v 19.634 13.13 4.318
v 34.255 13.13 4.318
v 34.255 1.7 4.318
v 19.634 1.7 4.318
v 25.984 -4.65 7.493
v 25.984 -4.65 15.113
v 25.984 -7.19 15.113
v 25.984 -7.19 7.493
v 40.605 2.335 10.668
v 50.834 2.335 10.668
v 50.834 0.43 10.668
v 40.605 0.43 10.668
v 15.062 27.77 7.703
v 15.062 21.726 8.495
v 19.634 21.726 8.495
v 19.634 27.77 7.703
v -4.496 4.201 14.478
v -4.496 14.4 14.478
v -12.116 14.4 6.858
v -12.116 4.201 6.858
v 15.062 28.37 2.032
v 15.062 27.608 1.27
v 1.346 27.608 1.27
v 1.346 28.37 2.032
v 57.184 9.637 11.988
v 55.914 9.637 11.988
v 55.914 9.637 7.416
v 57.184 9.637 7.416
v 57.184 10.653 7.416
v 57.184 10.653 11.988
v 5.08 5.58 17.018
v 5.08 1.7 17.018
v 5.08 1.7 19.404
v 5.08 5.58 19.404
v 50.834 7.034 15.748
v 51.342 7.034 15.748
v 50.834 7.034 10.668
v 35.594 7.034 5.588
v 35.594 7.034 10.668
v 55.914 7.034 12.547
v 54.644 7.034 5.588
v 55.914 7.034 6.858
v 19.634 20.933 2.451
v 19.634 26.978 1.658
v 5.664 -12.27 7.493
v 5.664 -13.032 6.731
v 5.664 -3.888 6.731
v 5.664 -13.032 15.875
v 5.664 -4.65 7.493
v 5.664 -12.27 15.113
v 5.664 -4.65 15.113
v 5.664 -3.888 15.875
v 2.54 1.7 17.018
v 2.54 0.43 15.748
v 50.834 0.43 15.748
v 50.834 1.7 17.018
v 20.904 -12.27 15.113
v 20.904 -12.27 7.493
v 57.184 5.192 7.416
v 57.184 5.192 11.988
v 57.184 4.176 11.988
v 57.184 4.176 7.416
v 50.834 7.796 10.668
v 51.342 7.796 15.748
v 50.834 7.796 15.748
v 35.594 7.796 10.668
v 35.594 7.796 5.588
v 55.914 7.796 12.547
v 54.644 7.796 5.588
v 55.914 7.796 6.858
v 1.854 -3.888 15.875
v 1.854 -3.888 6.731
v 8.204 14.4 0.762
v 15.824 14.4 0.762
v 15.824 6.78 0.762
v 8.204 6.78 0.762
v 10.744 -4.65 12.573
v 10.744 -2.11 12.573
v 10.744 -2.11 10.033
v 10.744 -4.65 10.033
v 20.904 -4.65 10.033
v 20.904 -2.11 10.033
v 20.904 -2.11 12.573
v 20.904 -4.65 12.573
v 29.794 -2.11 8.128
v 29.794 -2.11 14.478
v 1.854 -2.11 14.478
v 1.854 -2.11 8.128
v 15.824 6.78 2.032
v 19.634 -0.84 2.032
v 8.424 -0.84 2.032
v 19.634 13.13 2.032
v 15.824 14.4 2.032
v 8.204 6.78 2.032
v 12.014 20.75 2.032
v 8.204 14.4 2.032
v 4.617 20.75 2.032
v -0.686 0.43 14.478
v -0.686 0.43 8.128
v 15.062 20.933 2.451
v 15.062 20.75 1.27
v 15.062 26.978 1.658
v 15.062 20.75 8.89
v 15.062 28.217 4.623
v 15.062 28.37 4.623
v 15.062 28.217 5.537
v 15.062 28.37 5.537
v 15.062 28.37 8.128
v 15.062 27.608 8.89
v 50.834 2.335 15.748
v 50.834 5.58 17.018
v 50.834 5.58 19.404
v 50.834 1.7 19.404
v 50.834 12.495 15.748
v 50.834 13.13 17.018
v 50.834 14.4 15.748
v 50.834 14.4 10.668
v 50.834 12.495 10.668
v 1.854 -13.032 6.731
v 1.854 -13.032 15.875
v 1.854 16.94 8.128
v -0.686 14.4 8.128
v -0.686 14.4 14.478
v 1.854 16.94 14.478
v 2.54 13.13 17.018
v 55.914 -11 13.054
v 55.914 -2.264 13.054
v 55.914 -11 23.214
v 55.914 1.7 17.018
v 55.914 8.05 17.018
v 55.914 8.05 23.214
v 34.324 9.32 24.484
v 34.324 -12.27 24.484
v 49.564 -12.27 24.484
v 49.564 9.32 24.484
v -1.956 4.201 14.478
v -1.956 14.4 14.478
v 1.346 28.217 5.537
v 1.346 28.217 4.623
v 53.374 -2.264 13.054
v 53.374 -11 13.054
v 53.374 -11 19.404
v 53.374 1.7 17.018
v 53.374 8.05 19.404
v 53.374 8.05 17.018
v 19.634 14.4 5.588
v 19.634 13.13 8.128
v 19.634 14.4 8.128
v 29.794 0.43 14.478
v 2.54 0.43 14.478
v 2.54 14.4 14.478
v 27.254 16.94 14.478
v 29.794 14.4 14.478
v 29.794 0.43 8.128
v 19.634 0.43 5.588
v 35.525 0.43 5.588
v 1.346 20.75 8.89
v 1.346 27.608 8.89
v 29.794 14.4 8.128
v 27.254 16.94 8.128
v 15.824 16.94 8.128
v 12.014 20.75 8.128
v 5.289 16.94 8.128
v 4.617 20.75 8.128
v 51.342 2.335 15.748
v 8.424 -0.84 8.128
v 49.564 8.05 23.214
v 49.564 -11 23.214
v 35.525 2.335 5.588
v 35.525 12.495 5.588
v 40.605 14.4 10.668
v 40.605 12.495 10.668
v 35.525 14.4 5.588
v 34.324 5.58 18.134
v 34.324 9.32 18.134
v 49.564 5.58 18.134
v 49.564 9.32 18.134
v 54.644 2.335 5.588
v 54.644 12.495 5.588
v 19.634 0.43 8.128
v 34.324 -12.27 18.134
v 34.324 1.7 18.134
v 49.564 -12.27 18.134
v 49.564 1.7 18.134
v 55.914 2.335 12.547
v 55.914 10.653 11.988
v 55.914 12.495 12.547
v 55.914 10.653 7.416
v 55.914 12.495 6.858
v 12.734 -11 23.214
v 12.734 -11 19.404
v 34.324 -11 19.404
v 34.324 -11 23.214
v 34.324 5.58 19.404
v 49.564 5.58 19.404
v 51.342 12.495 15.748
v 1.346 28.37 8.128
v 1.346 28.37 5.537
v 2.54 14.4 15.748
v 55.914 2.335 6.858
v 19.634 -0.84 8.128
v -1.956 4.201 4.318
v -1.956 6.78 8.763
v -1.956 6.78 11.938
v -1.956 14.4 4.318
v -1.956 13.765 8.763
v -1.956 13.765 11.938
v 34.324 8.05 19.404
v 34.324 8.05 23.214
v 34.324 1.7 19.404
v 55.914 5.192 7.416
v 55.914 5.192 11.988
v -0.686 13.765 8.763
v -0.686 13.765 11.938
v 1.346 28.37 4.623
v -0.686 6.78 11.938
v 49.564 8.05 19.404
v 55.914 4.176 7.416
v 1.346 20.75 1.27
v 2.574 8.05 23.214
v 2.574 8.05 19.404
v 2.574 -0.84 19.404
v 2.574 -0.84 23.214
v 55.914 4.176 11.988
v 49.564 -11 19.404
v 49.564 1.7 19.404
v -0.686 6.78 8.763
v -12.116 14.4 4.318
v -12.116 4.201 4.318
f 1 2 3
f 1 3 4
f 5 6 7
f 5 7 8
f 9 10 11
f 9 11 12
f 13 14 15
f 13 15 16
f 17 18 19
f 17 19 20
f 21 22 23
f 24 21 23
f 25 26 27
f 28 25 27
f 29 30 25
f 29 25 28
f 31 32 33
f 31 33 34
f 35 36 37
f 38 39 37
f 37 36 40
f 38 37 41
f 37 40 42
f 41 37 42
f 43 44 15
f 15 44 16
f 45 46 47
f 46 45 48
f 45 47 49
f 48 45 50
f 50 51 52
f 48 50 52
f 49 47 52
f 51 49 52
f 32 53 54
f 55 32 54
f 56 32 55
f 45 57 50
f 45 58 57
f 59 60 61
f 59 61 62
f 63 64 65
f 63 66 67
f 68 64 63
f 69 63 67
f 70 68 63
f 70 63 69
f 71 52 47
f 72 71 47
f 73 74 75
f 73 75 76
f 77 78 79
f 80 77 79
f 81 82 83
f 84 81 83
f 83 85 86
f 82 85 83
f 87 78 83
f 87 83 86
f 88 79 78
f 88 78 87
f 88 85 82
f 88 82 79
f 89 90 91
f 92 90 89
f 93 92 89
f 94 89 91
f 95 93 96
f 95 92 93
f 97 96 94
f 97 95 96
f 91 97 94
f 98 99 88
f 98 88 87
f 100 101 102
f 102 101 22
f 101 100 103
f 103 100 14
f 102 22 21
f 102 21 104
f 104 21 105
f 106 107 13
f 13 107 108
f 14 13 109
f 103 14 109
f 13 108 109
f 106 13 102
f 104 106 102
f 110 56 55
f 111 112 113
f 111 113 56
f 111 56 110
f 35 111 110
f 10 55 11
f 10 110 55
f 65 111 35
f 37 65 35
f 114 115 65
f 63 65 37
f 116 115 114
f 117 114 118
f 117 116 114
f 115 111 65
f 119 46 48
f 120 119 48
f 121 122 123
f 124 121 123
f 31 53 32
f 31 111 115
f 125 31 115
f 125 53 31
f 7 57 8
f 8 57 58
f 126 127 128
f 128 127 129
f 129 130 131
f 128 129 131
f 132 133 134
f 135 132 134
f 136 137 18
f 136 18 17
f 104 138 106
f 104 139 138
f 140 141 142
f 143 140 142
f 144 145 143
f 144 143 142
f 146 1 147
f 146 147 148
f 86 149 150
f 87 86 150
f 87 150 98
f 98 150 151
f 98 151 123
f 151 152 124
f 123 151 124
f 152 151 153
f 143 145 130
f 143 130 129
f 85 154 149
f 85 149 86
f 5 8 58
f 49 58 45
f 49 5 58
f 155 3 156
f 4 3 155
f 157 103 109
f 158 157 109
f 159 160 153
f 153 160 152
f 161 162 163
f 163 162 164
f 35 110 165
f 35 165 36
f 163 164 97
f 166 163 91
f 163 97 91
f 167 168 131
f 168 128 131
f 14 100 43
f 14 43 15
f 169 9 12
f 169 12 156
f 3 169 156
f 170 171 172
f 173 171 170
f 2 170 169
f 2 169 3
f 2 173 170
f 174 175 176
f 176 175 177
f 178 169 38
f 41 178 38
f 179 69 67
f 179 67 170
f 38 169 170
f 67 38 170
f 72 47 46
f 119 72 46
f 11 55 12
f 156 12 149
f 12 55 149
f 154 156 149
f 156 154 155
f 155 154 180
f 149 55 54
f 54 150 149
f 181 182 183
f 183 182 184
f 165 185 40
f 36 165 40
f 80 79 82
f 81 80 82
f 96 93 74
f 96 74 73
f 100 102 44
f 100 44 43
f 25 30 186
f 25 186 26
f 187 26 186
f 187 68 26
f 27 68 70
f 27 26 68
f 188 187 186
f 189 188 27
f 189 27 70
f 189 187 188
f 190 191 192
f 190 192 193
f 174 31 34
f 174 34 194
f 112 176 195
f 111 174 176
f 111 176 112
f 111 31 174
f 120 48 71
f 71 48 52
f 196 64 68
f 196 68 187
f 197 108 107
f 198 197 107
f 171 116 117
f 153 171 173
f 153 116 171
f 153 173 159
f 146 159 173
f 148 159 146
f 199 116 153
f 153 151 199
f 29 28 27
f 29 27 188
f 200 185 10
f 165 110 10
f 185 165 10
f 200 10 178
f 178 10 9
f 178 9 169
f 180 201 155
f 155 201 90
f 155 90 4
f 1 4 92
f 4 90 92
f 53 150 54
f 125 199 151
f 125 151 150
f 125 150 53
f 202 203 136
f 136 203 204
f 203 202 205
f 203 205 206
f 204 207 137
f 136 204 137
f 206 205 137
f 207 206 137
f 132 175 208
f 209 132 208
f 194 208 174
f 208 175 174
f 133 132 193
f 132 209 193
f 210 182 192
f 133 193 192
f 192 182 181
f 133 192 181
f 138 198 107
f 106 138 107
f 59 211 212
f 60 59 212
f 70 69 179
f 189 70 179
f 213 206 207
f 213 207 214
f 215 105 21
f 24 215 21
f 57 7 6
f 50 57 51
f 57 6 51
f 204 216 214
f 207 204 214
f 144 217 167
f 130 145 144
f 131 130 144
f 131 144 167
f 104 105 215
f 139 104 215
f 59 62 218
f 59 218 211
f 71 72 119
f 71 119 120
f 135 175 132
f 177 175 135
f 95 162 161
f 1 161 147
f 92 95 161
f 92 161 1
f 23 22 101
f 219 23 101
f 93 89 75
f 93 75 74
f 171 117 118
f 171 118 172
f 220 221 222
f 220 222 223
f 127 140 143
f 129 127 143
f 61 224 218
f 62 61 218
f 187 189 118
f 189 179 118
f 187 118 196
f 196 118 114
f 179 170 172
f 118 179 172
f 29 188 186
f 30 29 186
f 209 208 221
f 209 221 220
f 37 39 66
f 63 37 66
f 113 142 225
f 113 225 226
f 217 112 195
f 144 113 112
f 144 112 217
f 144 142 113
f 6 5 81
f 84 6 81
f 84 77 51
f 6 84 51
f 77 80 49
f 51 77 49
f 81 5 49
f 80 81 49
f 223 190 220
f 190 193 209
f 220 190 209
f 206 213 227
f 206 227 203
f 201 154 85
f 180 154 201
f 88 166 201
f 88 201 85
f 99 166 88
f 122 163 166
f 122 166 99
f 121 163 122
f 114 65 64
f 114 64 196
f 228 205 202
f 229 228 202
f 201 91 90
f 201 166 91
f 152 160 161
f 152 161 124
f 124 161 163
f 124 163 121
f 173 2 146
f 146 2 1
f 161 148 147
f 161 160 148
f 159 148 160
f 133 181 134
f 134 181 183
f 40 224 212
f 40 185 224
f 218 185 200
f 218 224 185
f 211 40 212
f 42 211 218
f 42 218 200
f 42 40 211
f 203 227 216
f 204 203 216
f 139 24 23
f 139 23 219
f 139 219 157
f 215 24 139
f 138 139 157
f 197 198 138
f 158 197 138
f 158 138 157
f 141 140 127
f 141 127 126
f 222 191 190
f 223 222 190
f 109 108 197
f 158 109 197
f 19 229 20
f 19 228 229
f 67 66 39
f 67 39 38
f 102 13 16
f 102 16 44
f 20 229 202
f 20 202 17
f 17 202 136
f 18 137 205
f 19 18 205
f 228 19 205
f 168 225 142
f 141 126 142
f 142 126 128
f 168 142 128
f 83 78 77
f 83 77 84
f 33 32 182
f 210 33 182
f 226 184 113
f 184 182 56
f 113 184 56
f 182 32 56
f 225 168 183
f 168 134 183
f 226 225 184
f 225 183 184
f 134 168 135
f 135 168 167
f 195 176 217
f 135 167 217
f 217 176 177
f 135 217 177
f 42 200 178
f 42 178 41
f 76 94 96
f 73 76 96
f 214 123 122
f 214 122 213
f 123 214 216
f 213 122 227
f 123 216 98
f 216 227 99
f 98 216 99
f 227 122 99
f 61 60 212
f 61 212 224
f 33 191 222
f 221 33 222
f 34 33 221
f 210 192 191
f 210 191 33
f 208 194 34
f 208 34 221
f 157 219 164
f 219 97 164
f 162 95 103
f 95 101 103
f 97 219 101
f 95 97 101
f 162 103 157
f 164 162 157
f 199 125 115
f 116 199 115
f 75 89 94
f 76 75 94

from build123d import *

# Parameters (mm, degrees)
BOSS_EXTRUDE1_DEPTH       = 10.16
BOSS_EXTRUDE2_DEPTH       = 5.08
BOSS_EXTRUDE2_DEPTH_BACK  = 17.78
CHAMFER1_SIZE             = 1.27
BOSS_EXTRUDE3_DEPTH       = 7.62
CUT_EXTRUDE1_DEPTH        = 0.254
SCALE1_SCALE              = 0.6
CHAMFER3_SIZE             = 24.13
CHAMFER3_SIZE_2           = 4.254770044
BOSS_EXTRUDE7_DEPTH       = 6.35
CHAMFER4_SIZE             = 2.54
SKETCH9_W                 = 10.985229955
SKETCH9_H                 = 6.096
SKETCH9_W_2               = 4.255191267
CUT_EXTRUDE4_DEPTH        = 1.27
BOSS_EXTRUDE8_DEPTH       = 63.5
SKETCH12_W                = 0.141876601
SKETCH12_H                = 13.97
SKETCH12_W_2              = 2.398123399
CUT_EXTRUDE7_DEPTH        = 2.54
CHAMFER5_SIZE             = 1.27
SKETCH14_W                = 3.81
SKETCH14_H                = 7.62
BOSS_EXTRUDE9_DEPTH       = 1.27
SKETCH15_W                = 3.81
SKETCH15_H                = 7.62
BOSS_EXTRUDE10_DEPTH      = 10.16
SKETCH16_W                = 1.27
SKETCH16_H                = 7.62
CUT_EXTRUDE8_DEPTH        = 0.635
SKETCH17_W                = 1.27
SKETCH17_H                = 3.175
CUT_EXTRUDE9_DEPTH        = 0.635
CHAMFER6_SIZE             = 7.62
BOSS_EXTRUDE11_DEPTH      = 6.35
SKETCH19_W                = 43.866481186
SKETCH19_H                = 13.97
BOSS_EXTRUDE12_DEPTH      = 10.16
CHAMFER7_SIZE             = 1.27
SKETCH20_W                = 12.665631385
SKETCH20_H                = 5.08
SKETCH20_H_2              = 1.237744284
CUT_EXTRUDE12_DEPTH       = 17.78
SKETCH6_W                 = 7.62
SKETCH6_H                 = 7.62
BOSS_EXTRUDE13_DEPTH      = 1.27
SKETCH21_W                = 12.665631385
SKETCH21_H                = 6.35
CUT_EXTRUDE14_DEPTH       = 17.78
CUT_EXTRUDE15_DEPTH       = 17.78
BOSS_EXTRUDE14_DEPTH      = 2.54
SKETCH25_W                = 3.81
SKETCH25_H                = 19.05
BOSS_EXTRUDE15_DEPTH      = 50.8
CHAMFER8_SIZE             = 10.16
SKETCH26_W                = 45.754368615
SKETCH26_H                = 3.880635149
BOSS_EXTRUDE18_DEPTH      = 5.08
BOSS_EXTRUDE19_DEPTH      = 1.27
BOSS_EXTRUDE19_DEPTH_BACK = 5.08
SKETCH27_W                = 15.24
SKETCH27_H                = 19.05
SKETCH27_H_2              = 1.27
SKETCH28_W                = 10.16
SKETCH28_H                = 1.27
BOSS_EXTRUDE20_DEPTH      = 2.54
SKETCH29_W                = 20.32
SKETCH29_H                = 7.62
BOSS_EXTRUDE21_DEPTH      = 7.62
CHAMFER9_SIZE             = 5.08
SKETCH30_W                = 7.62
SKETCH30_H                = 7.62
BOSS_EXTRUDE22_DEPTH      = 3.81
BOSS_EXTRUDE24_DEPTH      = 5.08
BOSS_EXTRUDE24_DEPTH_BACK = 20.32
SKETCH31_W                = 5.08
SKETCH31_H                = 10.16
SKETCH32_W                = 10.16
SKETCH32_H                = 0.762
CUT_EXTRUDE16_DEPTH       = 5.08
SKETCH33_W                = 5.08
SKETCH33_H                = 0.762
CUT_EXTRUDE17_DEPTH       = 15.24
CHAMFER10_SIZE            = 4.572
CHAMFER10_SIZE2           = 3.201348865
CHAMFER11_SIZE            = 3.201348865
CHAMFER11_SIZE2           = 4.572
CHAMFER12_SIZE            = 1.27
BOSS_EXTRUDE25_DEPTH      = 1.27


with BuildPart() as part:
    # Sketch1 → Boss-Extrude1 (new body)
    with BuildSketch(Plane.XY):
        Polygon((0, 0), (0, 25.4), (12.7, 25.4), (25.4, 12.7), (25.4, 0), (25.4, -12.7), (0, -12.7), align=None)
    extrude(amount=BOSS_EXTRUDE1_DEPTH)

    # Sketch2 → Boss-Extrude2 (add, two sides: drawn at the far end of the back side and taken through both)
    with BuildSketch(Plane.ZY.offset(-BOSS_EXTRUDE2_DEPTH_BACK)):
        Polygon((5.08, 25.4), (11.43, 25.4), (11.43, 38.1), (-1.27, 38.1), (-1.27, 25.4), align=None)
    extrude(amount=BOSS_EXTRUDE2_DEPTH + BOSS_EXTRUDE2_DEPTH_BACK)

    # Chamfer1
    chamfer1_edges = [part.edges().sort_by_distance(p)[0] for p in [
        (6.35, 38.1, 11.43),
        (6.35, 38.1, -1.27),
    ]]
    chamfer(chamfer1_edges, length=CHAMFER1_SIZE)

    # Sketch3 → Boss-Extrude3 (add)
    with BuildSketch(Plane(origin=(17.78, 0, 0), x_dir=(0, 0, -1), z_dir=(1, 0, 0))):
        Polygon((-10.772282393, 27.027673315), (-9.451047753, 37.101398496), (0.622677429, 35.780163856), (-0.698557212, 25.706438674), align=None)
    extrude(amount=BOSS_EXTRUDE3_DEPTH)

    # Sketch4 → Cut-Extrude1 (cut)
    with BuildSketch(Plane(origin=(0, 38.1, 0), x_dir=(1, 0, 0), z_dir=(0, 1, 0))):
        Polygon((-5.08, -5.842), (17.78, -5.842), (17.78, -4.318), (-5.08, -4.318), (-5.08, -5.08), align=None)
    extrude(amount=-CUT_EXTRUDE1_DEPTH, mode=Mode.SUBTRACT)


with BuildPart() as part_1:
    # Scale1: scaled about (10.983797036, 13.773944281, 5.079695833)
    add(part.part.scale(SCALE1_SCALE).moved(Location((4.393518814, 5.509577712, 2.031878333))))

    # Chamfer3
    # the kernel refuses this chamfer: 24.13, 4.254770044 mm, written as the material it takes off along each edge
    with BuildSketch(Plane(origin=(4.393518814, -2.110422288, -60.670862824), x_dir=(-0.006682531656101754, 0.9999776716360547, 0), z_dir=(0, 0, 1))) as chamfer3_piece_1_section:
        Polygon((CHAMFER3_SIZE * 0.999977671636, -CHAMFER3_SIZE * 0.0066825316561), (-CHAMFER3_SIZE_2 * 0.00668253165688, -CHAMFER3_SIZE_2 * 0.999977671752), (0, 0), align=None)
    chamfer3_piece_1 = extrude(amount=131.501482315, mode=Mode.PRIVATE)
    chamfer3_piece_1 = split(chamfer3_piece_1, bisect_by=Plane(origin=(5.574307044, 20.749577712, 5.079878333), z_dir=(0, -1, 0)), keep=Keep.TOP, mode=Mode.PRIVATE)
    add(chamfer3_piece_1, mode=Mode.SUBTRACT)

    # Sketch8 → Boss-Extrude7 (add)
    with BuildSketch(Plane.XY.offset(8.127878333)):
        Polygon((19.633518814, -2.110422288), (29.793518814, -2.110422288), (29.793518814, 16.939577712), (-0.686481186, 16.939577712), (-0.686481186, -2.110422288), align=None)
    extrude(amount=BOSS_EXTRUDE7_DEPTH)

    # Chamfer4
    chamfer4_edges = [part_1.edges().sort_by_distance(p)[0] for p in [
        (-0.686481186, -2.110422288, 11.302878333),
        (29.793518814, -2.110422288, 11.302878333),
        (29.793518814, 16.939577712, 11.302878333),
        (-0.686481186, 16.939577712, 11.302878333),
    ]]
    chamfer(chamfer4_edges, length=CHAMFER4_SIZE)

    # Sketch9 → Cut-Extrude4 (cut)
    with BuildSketch(Plane.XZ.offset(2.110422288)):
        with Locations((14.140903837, 5.079878333)):
            Rectangle(SKETCH9_W, SKETCH9_H)
        with Locations((6.520693226, 5.079878333)):
            Rectangle(SKETCH9_W_2, SKETCH9_H)
    extrude(amount=-CUT_EXTRUDE4_DEPTH, mode=Mode.SUBTRACT)

    # Sketch10 → Boss-Extrude8 (add)
    with BuildSketch(Plane.ZY):
        Polygon((14.477878333, 14.399577712), (14.477878333, 0.429577712), (17.017878333, 0.429577712), (17.017878333, 14.399577712), (14.861111331, 14.399577712), align=None)
    extrude(amount=-BOSS_EXTRUDE8_DEPTH)

    # Sketch12 → Cut-Extrude7 (cut)
    with BuildSketch(Plane.ZY):
        with Locations((14.548816634, 7.414577712)):
            Rectangle(SKETCH12_W, SKETCH12_H)
        with Locations((15.818816634, 7.414577712)):
            Rectangle(SKETCH12_W_2, SKETCH12_H)
    extrude(amount=-CUT_EXTRUDE7_DEPTH, mode=Mode.SUBTRACT)

    # Chamfer5
    chamfer5_edges = [part_1.edges().sort_by_distance(p)[0] for p in [
        (33.02, 14.399577712, 17.017878333),
        (33.02, 0.429577712, 17.017878333),
    ]]
    chamfer(chamfer5_edges, length=CHAMFER5_SIZE)

    # Sketch14 → Boss-Extrude9 (add)
    with BuildSketch(Plane.ZY.offset(0.686481186)):
        with Locations((10.032878333, 10.589577712)):
            Rectangle(SKETCH14_W, SKETCH14_H)
    extrude(amount=BOSS_EXTRUDE9_DEPTH)

    # Sketch15 → Boss-Extrude10 (add)
    with BuildSketch(Plane.ZY.offset(1.956481186)):
        Polygon((11.937878333, 4.200697775), (11.937878333, 6.779577712), (8.127878333, 6.779577712), (8.127878333, 14.399577712), (4.317878333, 14.399577712), (4.317878333, 4.200697775), align=None)
        with Locations((10.032878333, 10.589577712)):
            Rectangle(SKETCH15_W, SKETCH15_H)
        Polygon((14.477878333, 14.399577712), (14.477878333, 4.200697775), (11.937878333, 4.200697775), (11.937878333, 6.779577712), (11.937878333, 14.399577712), align=None)
    extrude(amount=BOSS_EXTRUDE10_DEPTH)

    # Sketch16 → Cut-Extrude8 (cut)
    with BuildSketch(Plane(origin=(0, 0, 8.127878333), x_dir=(-1, 0, 0), z_dir=(0, 0, -1))):
        with Locations((1.321481186, 10.589577712)):
            Rectangle(SKETCH16_W, SKETCH16_H)
    extrude(amount=-CUT_EXTRUDE8_DEPTH, mode=Mode.SUBTRACT)

    # Sketch17 → Cut-Extrude9 (cut)
    with BuildSketch(Plane(origin=(0, 14.399577712, 0), x_dir=(1, 0, 0), z_dir=(0, 1, 0))):
        with Locations((-1.321481186, -10.350378333)):
            Rectangle(SKETCH17_W, SKETCH17_H)
    extrude(amount=-CUT_EXTRUDE9_DEPTH, mode=Mode.SUBTRACT)

    # Chamfer6
    chamfer6_edges = [part_1.edges().sort_by_distance(p)[0] for p in [
        (-12.116481186, 9.300137744, 14.477878333),
    ]]
    chamfer(chamfer6_edges, length=CHAMFER6_SIZE)

    # Sketch18 → Boss-Extrude11 (add)
    with BuildSketch(Plane(origin=(0, 0, 8.127878333), x_dir=(-1, 0, 0), z_dir=(0, 0, -1))):
        Polygon((-27.253518814, -2.110422288), (-29.793518814, 0.429577712), (-29.793518814, -2.110422288), align=None)
    extrude(amount=-BOSS_EXTRUDE11_DEPTH)

    # Sketch19 → Boss-Extrude12 (add)
    with BuildSketch(Plane(origin=(0, 0, 14.477878333), x_dir=(-1, 0, 0), z_dir=(0, 0, -1))):
        with Locations((-41.566759407, 7.414577712)):
            Rectangle(SKETCH19_W, SKETCH19_H)
    extrude(amount=BOSS_EXTRUDE12_DEPTH)

    # Chamfer7
    chamfer7_edges = [part_1.edges().sort_by_distance(p)[0] for p in [
        (41.566759407, 14.399577712, 4.317878333),
        (41.566759407, 0.429577712, 4.317878333),
    ]]
    chamfer(chamfer7_edges, length=CHAMFER7_SIZE)

    # Sketch20 → Cut-Extrude12 (cut)
    with BuildSketch(Plane(origin=(0, 14.399577712, 0), x_dir=(1, 0, 0), z_dir=(0, 1, 0))):
        Polygon((63.5, -1.736490395), (63.5, -4.350134049), (50.834368615, -4.350134049), (44.484368615, -4.350134049), (41.857380808, -1.736490395), align=None)
        with Locations((57.167184308, -8.127878333)):
            Rectangle(SKETCH20_W, SKETCH20_H)
        Polygon((50.834368615, -4.350134049), (44.484368615, -4.350134049), (45.728432296, -5.587878333), (50.834368615, -5.587878333), align=None)
        Polygon((50.834368615, -5.587878333), (45.728432296, -5.587878333), (50.834368615, -10.667878333), align=None)
        with Locations((57.167184308, -4.969006191)):
            Rectangle(SKETCH20_W, SKETCH20_H_2)
    extrude(amount=-CUT_EXTRUDE12_DEPTH, mode=Mode.SUBTRACT)

    # Sketch6 → Boss-Extrude13 (add)
    with BuildSketch(Plane(origin=(0, 0, 2.031878333), x_dir=(-1, 0, 0), z_dir=(0, 0, -1))):
        with Locations((-12.013518814, 10.589577712)):
            Rectangle(SKETCH6_W, SKETCH6_H)
    extrude(amount=BOSS_EXTRUDE13_DEPTH)

    # Sketch21 → Cut-Extrude14 (cut)
    with BuildSketch(Plane(origin=(0, 14.399577712, 0), x_dir=(1, 0, 0), z_dir=(0, 1, 0))):
        with Locations((57.167184308, -13.842878333)):
            Rectangle(SKETCH21_W, SKETCH21_H)
    extrude(amount=-CUT_EXTRUDE14_DEPTH, mode=Mode.SUBTRACT)

    # Sketch22 → Cut-Extrude15 (cut)
    with BuildSketch(Plane(origin=(0, 14.399577712, 0), x_dir=(1, 0, 0), z_dir=(0, 1, 0))):
        Polygon((50.834368615, -10.667878333), (40.604954359, -10.667878333), (33.066219798, -3.129143772), (50.834368615, -3.464094762), align=None)
    extrude(amount=-CUT_EXTRUDE15_DEPTH, mode=Mode.SUBTRACT)



with BuildPart() as body_2:
    # Sketch24 → Boss-Extrude14 (new body)
    with BuildSketch(Plane(origin=(53.374368615, 0, 0), x_dir=(0, 0, -1), z_dir=(1, 0, 0))):
        Polygon((-15.747878333, 0.429577712), (-13.053801497, -2.264499124), (-13.053801497, -11.000422288), (-23.213801497, -11.000422288), (-23.213801497, 8.049577712), (-17.017878333, 8.049577712), (-17.017878333, 1.699577712), align=None)
    extrude(amount=BOSS_EXTRUDE14_DEPTH)

    # Sketch25 → Boss-Extrude15 (add)
    with BuildSketch(Plane.ZY.offset(-53.374368615)):
        with Locations((21.308801497, -1.475422288)):
            Rectangle(SKETCH25_W, SKETCH25_H)
    extrude(amount=BOSS_EXTRUDE15_DEPTH)

    # Chamfer8
    chamfer8_edges = [body_2.edges().sort_by_distance(p)[0] for p in [
        (2.574368615, -11.000422288, 21.308801497),
    ]]
    chamfer(chamfer8_edges, length=CHAMFER8_SIZE)


with BuildPart() as part_2:
    add(part_1.part)

    add(body_2.part)  # Boss-Extrude18 merges body 2
    # Sketch26 → Boss-Extrude18 (add)
    with BuildSketch(Plane.XY.offset(17.017878333)):
        with Locations((27.957184308, 3.639895287)):
            Rectangle(SKETCH26_W, SKETCH26_H)
    extrude(amount=BOSS_EXTRUDE18_DEPTH)

    # Sketch27 → Boss-Extrude19 (add, two sides: drawn at the far end of the back side and taken through both)
    with BuildSketch(Plane.XY.offset(23.213801497).offset(-BOSS_EXTRUDE19_DEPTH_BACK)):
        with Locations((41.944368615, -1.475422288)):
            Rectangle(SKETCH27_W, SKETCH27_H)
        with Locations((41.944368615, 8.684577712)):
            Rectangle(SKETCH27_W, SKETCH27_H_2)
        with Locations((41.944368615, -11.635422288)):
            Rectangle(SKETCH27_W, SKETCH27_H_2)
    extrude(amount=BOSS_EXTRUDE19_DEPTH + BOSS_EXTRUDE19_DEPTH_BACK)

    # Sketch28 → Boss-Extrude20 (add)
    with BuildSketch(Plane.XZ.offset(2.110422288)):
        with Locations((15.823518814, 11.937878333)):
            Rectangle(SKETCH28_W, SKETCH28_H)
        with Locations((15.823518814, 10.667878333)):
            Rectangle(SKETCH28_W, SKETCH28_H)
    extrude(amount=BOSS_EXTRUDE20_DEPTH)

    # Sketch29 → Boss-Extrude21 (add)
    with BuildSketch(Plane(origin=(0, -4.650422288, 0), x_dir=(-1, 0, 0), z_dir=(0, -1, 0))):
        with Locations((-15.823518814, -11.302878333)):
            Rectangle(SKETCH29_W, SKETCH29_H)
    extrude(amount=BOSS_EXTRUDE21_DEPTH)

    # Chamfer9
    chamfer9_edges = [part_2.edges().sort_by_distance(p)[0] for p in [
        (25.983518814, -12.270422288, 11.302878333),
    ]]
    chamfer(chamfer9_edges, length=CHAMFER9_SIZE)

    # Sketch30 → Boss-Extrude22 (add)
    with BuildSketch(Plane.ZY.offset(-5.663518814)):
        Polygon((7.492878333, -13.032422288), (7.492878333, -12.270422288), (7.492878333, -4.650422288), (15.112878333, -4.650422288), (15.112878333, -3.888422288), (6.730878333, -3.888422288), (6.730878333, -13.032422288), align=None)
        Polygon((15.112878333, -12.270422288), (7.492878333, -12.270422288), (7.492878333, -13.032422288), (15.874878333, -13.032422288), (15.874878333, -3.888422288), (15.112878333, -3.888422288), (15.112878333, -4.650422288), align=None)
        with Locations((11.302878333, -8.460422288)):
            Rectangle(SKETCH30_W, SKETCH30_H)
    extrude(amount=BOSS_EXTRUDE22_DEPTH)

    # Sketch31 → Boss-Extrude24 (add, two sides: drawn at the far end of the back side and taken through both)
    with BuildSketch(Plane(origin=(50.834368615, 0, 0), x_dir=(0, 0, -1), z_dir=(1, 0, 0)).offset(-BOSS_EXTRUDE24_DEPTH_BACK)):
        with Locations((-8.127878333, 7.414577712)):
            Rectangle(SKETCH31_W, SKETCH31_H)
        with Locations((-13.207878333, 7.414577712)):
            Rectangle(SKETCH31_W, SKETCH31_H)
    extrude(amount=BOSS_EXTRUDE24_DEPTH + BOSS_EXTRUDE24_DEPTH_BACK)

    # Sketch32 → Cut-Extrude16 (cut)
    with BuildSketch(Plane(origin=(55.914368615, 0, 0), x_dir=(0, 0, -1), z_dir=(1, 0, 0))):
        with Locations((-10.667878333, 7.414577712)):
            Rectangle(SKETCH32_W, SKETCH32_H)
    extrude(amount=-CUT_EXTRUDE16_DEPTH, mode=Mode.SUBTRACT)

    # Sketch33 → Cut-Extrude17 (cut)
    with BuildSketch(Plane(origin=(50.834368615, 0, 0), x_dir=(0, 0, -1), z_dir=(1, 0, 0))):
        with Locations((-8.127878333, 7.414577712)):
            Rectangle(SKETCH33_W, SKETCH33_H)
    extrude(amount=-CUT_EXTRUDE17_DEPTH, mode=Mode.SUBTRACT)

    # Chamfer10
    chamfer10_edges = [part_2.edges().sort_by_distance(p)[0] for p in [
        (55.914368615, 4.684077712, 15.747878333),
    ]]
    chamfer10_side = [part_2.faces().sort_by_distance(p)[0] for p in [
        (53.374368615, 4.684077712, 15.747878333),
    ]]
    chamfer(chamfer10_edges, length=CHAMFER10_SIZE, length2=CHAMFER10_SIZE2, reference=chamfer10_side[0])

    # Chamfer11
    chamfer11_edges = [part_2.edges().sort_by_distance(p)[0] for p in [
        (55.914368615, 10.145077712, 15.747878333),
    ]]
    chamfer11_side = [part_2.faces().sort_by_distance(p)[0] for p in [
        (55.914368615, 10.145077712, 10.667878333),
    ]]
    chamfer(chamfer11_edges, length=CHAMFER11_SIZE, length2=CHAMFER11_SIZE2, reference=chamfer11_side[0])

    # Chamfer12
    chamfer12_edges = [part_2.edges().sort_by_distance(p)[0] for p in [
        (55.914368615, 4.684077712, 5.587878333),
        (55.914368615, 10.145077712, 5.587878333),
    ]]
    chamfer(chamfer12_edges, length=CHAMFER12_SIZE)

    # Sketch35 → Boss-Extrude25 (add)
    with BuildSketch(Plane(origin=(55.914368615, 0, 0), x_dir=(0, 0, -1), z_dir=(1, 0, 0))):
        Polygon((-9.087214589, 9.637077712), (-10.317193213, 10.653077712), (-11.988203901, 10.653077712), (-11.988203901, 9.637077712), align=None)
        Polygon((-7.416203901, 10.653077712), (-10.317193213, 10.653077712), (-9.087214589, 9.637077712), (-7.416203901, 9.637077712), align=None)
        Polygon((-7.416203901, 5.192077712), (-10.317193213, 5.192077712), (-9.087214589, 4.176077712), (-7.416203901, 4.176077712), align=None)
        Polygon((-9.087214589, 4.176077712), (-10.317193213, 5.192077712), (-11.988203901, 5.192077712), (-11.988203901, 4.176077712), align=None)
    extrude(amount=BOSS_EXTRUDE25_DEPTH)


solid = part_2.part
